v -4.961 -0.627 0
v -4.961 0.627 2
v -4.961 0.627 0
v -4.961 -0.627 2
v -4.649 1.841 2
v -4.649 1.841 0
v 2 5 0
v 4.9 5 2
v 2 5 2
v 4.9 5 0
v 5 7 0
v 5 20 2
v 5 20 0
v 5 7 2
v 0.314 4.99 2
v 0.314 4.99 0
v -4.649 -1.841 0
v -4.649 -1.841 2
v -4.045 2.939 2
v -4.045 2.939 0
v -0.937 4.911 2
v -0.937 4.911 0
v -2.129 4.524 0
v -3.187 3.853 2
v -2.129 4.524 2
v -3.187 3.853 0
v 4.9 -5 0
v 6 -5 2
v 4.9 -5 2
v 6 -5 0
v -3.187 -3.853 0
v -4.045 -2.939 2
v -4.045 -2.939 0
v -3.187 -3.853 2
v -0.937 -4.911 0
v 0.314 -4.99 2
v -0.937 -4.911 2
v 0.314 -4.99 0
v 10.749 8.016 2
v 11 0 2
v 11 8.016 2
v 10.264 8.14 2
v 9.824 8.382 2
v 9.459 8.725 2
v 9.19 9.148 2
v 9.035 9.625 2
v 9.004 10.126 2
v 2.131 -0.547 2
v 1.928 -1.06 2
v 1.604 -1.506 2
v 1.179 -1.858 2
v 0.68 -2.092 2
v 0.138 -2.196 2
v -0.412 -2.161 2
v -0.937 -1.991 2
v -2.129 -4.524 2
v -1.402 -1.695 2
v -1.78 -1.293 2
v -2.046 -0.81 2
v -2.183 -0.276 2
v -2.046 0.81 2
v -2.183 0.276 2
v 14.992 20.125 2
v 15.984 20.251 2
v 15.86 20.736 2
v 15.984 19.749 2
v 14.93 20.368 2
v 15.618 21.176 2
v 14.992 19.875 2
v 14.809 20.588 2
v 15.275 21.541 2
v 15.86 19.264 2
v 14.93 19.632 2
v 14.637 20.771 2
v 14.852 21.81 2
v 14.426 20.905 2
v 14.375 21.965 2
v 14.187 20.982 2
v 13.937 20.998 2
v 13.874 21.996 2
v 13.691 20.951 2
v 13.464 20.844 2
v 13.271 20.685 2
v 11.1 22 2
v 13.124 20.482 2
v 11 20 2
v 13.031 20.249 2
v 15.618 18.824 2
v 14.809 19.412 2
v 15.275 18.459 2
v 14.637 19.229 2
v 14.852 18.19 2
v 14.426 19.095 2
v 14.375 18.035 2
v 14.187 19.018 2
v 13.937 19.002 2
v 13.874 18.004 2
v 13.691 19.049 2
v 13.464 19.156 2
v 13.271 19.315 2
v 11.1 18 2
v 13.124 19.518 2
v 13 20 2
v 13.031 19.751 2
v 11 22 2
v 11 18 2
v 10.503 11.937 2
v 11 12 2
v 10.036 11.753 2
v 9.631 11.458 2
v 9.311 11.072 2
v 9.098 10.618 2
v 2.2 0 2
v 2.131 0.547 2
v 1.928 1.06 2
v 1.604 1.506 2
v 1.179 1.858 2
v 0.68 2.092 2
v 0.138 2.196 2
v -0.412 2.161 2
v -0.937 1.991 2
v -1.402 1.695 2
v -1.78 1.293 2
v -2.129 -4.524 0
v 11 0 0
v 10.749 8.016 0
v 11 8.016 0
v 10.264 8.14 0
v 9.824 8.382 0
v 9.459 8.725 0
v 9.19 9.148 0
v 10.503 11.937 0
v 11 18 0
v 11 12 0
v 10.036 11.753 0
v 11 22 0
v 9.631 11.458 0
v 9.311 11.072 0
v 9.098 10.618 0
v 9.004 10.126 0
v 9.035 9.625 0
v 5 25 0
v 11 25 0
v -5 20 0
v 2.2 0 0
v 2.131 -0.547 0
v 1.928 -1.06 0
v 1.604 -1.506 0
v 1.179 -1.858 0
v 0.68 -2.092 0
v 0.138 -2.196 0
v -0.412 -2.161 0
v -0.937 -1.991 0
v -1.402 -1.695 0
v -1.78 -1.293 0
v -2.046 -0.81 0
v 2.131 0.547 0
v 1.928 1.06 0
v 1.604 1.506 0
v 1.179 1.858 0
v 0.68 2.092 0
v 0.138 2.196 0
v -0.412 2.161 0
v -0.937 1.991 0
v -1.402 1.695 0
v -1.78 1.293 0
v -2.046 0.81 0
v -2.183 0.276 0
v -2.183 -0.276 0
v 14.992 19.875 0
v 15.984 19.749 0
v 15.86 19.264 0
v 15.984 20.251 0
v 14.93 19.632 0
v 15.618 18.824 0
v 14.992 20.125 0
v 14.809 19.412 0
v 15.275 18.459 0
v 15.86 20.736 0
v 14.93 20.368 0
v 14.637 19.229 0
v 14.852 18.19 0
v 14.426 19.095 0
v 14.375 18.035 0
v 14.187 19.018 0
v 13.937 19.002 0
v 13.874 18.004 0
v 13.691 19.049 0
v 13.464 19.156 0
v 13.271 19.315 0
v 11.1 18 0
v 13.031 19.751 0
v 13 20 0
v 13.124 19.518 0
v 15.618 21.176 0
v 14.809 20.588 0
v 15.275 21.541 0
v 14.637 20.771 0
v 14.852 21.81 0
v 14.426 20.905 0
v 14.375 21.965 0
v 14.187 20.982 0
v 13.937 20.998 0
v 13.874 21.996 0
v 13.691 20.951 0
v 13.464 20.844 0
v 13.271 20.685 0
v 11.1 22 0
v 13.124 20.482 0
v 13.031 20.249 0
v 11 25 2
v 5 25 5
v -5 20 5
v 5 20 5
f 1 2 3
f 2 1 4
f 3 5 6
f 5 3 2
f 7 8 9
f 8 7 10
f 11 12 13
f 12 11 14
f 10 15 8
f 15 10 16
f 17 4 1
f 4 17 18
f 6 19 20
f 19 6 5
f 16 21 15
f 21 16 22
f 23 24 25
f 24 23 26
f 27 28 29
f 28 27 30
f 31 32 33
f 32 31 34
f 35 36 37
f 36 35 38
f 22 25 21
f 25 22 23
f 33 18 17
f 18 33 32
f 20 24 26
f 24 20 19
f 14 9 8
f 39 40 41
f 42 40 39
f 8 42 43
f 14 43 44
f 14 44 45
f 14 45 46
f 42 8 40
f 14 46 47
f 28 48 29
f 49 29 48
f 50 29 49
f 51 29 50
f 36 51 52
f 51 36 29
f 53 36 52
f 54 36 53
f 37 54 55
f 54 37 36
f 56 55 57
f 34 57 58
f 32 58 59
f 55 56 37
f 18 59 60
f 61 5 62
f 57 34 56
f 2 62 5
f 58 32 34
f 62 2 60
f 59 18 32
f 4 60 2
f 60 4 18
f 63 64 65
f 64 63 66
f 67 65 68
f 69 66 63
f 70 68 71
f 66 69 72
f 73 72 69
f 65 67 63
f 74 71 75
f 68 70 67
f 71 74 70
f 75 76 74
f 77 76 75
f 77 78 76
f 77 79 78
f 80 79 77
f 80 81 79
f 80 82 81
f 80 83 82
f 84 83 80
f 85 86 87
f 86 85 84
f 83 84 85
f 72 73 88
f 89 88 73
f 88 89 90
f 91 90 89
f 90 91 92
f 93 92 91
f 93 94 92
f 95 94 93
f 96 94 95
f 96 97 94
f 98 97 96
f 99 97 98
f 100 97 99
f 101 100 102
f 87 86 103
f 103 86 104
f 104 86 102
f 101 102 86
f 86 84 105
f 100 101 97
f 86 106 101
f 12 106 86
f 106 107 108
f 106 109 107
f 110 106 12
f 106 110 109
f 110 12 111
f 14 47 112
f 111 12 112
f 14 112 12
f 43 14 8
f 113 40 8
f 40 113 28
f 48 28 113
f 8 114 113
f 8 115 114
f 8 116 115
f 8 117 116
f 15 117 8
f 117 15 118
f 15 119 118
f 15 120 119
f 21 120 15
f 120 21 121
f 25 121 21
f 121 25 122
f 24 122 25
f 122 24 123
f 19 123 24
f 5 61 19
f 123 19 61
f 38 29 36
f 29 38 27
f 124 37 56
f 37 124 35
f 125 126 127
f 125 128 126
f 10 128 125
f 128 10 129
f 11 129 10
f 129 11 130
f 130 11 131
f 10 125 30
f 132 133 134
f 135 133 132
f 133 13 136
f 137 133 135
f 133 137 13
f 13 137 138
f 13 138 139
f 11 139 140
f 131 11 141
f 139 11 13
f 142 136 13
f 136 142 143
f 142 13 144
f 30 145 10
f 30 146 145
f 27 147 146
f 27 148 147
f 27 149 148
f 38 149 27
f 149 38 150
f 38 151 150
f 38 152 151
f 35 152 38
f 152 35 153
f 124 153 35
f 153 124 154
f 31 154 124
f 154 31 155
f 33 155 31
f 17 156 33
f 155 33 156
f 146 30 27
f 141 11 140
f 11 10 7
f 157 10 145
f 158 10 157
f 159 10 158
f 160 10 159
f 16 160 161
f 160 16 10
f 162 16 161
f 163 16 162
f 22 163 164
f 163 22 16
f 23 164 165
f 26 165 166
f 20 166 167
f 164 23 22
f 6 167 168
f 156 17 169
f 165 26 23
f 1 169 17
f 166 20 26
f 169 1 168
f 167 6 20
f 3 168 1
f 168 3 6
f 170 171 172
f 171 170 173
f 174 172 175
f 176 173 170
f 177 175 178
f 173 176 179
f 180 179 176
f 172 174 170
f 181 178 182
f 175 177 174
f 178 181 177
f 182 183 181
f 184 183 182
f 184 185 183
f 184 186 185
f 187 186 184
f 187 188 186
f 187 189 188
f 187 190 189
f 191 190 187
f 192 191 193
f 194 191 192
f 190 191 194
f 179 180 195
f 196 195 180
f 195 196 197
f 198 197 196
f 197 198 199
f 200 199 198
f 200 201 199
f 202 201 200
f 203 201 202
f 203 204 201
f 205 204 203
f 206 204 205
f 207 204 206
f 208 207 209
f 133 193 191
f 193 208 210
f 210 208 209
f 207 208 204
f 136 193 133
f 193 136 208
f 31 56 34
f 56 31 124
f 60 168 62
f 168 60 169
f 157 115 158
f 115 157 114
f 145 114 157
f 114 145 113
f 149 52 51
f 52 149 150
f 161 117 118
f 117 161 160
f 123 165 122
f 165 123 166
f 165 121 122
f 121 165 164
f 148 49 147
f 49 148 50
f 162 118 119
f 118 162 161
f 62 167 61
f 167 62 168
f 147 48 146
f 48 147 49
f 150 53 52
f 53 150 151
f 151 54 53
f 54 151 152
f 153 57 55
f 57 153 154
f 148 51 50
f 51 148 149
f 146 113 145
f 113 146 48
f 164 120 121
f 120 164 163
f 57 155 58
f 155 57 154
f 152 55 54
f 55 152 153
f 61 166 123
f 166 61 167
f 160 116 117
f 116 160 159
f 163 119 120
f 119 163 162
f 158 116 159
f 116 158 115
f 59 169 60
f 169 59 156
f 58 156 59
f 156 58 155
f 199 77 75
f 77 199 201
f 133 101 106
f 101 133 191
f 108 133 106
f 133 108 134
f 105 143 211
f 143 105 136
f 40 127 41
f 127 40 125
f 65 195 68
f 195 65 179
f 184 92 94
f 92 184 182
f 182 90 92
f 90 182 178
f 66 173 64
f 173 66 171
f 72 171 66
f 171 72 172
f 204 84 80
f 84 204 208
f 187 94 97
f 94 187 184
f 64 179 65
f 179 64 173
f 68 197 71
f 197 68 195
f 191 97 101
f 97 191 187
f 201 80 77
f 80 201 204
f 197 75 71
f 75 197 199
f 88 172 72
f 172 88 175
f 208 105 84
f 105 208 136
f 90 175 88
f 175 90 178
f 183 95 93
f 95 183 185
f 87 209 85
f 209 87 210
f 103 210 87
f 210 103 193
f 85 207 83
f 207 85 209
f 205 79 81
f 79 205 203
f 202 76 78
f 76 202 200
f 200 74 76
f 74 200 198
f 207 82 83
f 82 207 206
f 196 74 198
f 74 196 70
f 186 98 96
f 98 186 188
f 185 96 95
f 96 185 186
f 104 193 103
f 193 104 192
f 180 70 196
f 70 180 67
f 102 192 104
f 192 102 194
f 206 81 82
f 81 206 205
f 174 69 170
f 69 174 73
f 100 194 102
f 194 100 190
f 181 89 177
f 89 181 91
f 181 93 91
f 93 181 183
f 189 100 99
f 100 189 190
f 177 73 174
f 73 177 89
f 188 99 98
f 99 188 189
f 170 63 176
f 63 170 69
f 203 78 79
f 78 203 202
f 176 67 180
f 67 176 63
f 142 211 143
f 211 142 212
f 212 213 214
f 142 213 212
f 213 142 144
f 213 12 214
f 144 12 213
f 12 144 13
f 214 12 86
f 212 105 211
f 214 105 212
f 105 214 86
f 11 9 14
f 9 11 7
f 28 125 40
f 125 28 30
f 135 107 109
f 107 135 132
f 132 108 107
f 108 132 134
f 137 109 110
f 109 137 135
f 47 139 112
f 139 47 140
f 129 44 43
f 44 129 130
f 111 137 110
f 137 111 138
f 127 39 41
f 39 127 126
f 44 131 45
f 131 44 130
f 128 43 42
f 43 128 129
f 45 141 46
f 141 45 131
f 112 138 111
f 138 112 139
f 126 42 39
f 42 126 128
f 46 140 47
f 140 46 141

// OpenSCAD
include <MCAD/triangles.scad>

$fn = 25;

    dia_pivot_hole = 4.4;
    dia_pivot = 10;
    l_hole_to_spine = 5;
    thk_trig = 2;
    
    x_tri = 10;
    y_tri = 5;
    thk_tri = 5;
    
    l_trigger = 30;
    w_spine = 6;
    
    pull_tab_hole = 2;
    od_pull_tab = 4;
    l_pull_tab = 3;
    
    chamfer = 5;
    difference()
    {
    union()
    {
    // pivot tab
    hole_tab(dia_pivot,dia_pivot_hole,l_hole_to_spine,thk_trig);
    
    // main spine
    translate([l_hole_to_spine,-dia_pivot/2,0])
    rotate([0,0,0])
    cube([w_spine,l_trigger,thk_trig]);
    
    // triangle bit
    translate([l_hole_to_spine,l_trigger-dia_pivot/2-y_tri,0])
    rotate([0,0,90])
    triangle(x_tri,y_tri,thk_tri);
    
    translate([l_hole_to_spine,l_trigger-dia_pivot/2,thk_trig])
    rotate([90,0,0])
    triangle(thk_tri-thk_trig,w_spine,thk_tri);
    
    // chamfer
    translate([l_hole_to_spine,dia_pivot/2,0])
    rotate([0,0,90])
    triangle(3,2,thk_trig);
    
    // pull tab
    translate([l_hole_to_spine+l_pull_tab+w_spine,l_trigger-dia_pivot/2-y_tri,thk_trig])
    rotate([0,180,0])
    hole_tab(od_pull_tab,pull_tab_hole,l_pull_tab,thk_trig);
    
}
    // chamfer
    translate([l_hole_to_spine+w_spine,-dia_pivot/2,0])
    rotate([0,0,90])
    triangle(chamfer,chamfer,thk_trig);

    //rubber band dent
    translate([l_hole_to_spine+w_spine,10,0])
    rotate([0,0,90])
    cylinder(d=4,h=thk_trig);



}

module hole_tab(dia,hole_dia,l_centre_to_end,tab_thk)
{
    difference()
    {
        hull()
        {
            cylinder(d=dia,h=tab_thk);
            translate([l_centre_to_end-0.1,-dia/2,0])
                cube([0.1,dia,tab_thk]);
        }
        //hole
        cylinder(d=hole_dia,h=tab_thk);
    }
}
